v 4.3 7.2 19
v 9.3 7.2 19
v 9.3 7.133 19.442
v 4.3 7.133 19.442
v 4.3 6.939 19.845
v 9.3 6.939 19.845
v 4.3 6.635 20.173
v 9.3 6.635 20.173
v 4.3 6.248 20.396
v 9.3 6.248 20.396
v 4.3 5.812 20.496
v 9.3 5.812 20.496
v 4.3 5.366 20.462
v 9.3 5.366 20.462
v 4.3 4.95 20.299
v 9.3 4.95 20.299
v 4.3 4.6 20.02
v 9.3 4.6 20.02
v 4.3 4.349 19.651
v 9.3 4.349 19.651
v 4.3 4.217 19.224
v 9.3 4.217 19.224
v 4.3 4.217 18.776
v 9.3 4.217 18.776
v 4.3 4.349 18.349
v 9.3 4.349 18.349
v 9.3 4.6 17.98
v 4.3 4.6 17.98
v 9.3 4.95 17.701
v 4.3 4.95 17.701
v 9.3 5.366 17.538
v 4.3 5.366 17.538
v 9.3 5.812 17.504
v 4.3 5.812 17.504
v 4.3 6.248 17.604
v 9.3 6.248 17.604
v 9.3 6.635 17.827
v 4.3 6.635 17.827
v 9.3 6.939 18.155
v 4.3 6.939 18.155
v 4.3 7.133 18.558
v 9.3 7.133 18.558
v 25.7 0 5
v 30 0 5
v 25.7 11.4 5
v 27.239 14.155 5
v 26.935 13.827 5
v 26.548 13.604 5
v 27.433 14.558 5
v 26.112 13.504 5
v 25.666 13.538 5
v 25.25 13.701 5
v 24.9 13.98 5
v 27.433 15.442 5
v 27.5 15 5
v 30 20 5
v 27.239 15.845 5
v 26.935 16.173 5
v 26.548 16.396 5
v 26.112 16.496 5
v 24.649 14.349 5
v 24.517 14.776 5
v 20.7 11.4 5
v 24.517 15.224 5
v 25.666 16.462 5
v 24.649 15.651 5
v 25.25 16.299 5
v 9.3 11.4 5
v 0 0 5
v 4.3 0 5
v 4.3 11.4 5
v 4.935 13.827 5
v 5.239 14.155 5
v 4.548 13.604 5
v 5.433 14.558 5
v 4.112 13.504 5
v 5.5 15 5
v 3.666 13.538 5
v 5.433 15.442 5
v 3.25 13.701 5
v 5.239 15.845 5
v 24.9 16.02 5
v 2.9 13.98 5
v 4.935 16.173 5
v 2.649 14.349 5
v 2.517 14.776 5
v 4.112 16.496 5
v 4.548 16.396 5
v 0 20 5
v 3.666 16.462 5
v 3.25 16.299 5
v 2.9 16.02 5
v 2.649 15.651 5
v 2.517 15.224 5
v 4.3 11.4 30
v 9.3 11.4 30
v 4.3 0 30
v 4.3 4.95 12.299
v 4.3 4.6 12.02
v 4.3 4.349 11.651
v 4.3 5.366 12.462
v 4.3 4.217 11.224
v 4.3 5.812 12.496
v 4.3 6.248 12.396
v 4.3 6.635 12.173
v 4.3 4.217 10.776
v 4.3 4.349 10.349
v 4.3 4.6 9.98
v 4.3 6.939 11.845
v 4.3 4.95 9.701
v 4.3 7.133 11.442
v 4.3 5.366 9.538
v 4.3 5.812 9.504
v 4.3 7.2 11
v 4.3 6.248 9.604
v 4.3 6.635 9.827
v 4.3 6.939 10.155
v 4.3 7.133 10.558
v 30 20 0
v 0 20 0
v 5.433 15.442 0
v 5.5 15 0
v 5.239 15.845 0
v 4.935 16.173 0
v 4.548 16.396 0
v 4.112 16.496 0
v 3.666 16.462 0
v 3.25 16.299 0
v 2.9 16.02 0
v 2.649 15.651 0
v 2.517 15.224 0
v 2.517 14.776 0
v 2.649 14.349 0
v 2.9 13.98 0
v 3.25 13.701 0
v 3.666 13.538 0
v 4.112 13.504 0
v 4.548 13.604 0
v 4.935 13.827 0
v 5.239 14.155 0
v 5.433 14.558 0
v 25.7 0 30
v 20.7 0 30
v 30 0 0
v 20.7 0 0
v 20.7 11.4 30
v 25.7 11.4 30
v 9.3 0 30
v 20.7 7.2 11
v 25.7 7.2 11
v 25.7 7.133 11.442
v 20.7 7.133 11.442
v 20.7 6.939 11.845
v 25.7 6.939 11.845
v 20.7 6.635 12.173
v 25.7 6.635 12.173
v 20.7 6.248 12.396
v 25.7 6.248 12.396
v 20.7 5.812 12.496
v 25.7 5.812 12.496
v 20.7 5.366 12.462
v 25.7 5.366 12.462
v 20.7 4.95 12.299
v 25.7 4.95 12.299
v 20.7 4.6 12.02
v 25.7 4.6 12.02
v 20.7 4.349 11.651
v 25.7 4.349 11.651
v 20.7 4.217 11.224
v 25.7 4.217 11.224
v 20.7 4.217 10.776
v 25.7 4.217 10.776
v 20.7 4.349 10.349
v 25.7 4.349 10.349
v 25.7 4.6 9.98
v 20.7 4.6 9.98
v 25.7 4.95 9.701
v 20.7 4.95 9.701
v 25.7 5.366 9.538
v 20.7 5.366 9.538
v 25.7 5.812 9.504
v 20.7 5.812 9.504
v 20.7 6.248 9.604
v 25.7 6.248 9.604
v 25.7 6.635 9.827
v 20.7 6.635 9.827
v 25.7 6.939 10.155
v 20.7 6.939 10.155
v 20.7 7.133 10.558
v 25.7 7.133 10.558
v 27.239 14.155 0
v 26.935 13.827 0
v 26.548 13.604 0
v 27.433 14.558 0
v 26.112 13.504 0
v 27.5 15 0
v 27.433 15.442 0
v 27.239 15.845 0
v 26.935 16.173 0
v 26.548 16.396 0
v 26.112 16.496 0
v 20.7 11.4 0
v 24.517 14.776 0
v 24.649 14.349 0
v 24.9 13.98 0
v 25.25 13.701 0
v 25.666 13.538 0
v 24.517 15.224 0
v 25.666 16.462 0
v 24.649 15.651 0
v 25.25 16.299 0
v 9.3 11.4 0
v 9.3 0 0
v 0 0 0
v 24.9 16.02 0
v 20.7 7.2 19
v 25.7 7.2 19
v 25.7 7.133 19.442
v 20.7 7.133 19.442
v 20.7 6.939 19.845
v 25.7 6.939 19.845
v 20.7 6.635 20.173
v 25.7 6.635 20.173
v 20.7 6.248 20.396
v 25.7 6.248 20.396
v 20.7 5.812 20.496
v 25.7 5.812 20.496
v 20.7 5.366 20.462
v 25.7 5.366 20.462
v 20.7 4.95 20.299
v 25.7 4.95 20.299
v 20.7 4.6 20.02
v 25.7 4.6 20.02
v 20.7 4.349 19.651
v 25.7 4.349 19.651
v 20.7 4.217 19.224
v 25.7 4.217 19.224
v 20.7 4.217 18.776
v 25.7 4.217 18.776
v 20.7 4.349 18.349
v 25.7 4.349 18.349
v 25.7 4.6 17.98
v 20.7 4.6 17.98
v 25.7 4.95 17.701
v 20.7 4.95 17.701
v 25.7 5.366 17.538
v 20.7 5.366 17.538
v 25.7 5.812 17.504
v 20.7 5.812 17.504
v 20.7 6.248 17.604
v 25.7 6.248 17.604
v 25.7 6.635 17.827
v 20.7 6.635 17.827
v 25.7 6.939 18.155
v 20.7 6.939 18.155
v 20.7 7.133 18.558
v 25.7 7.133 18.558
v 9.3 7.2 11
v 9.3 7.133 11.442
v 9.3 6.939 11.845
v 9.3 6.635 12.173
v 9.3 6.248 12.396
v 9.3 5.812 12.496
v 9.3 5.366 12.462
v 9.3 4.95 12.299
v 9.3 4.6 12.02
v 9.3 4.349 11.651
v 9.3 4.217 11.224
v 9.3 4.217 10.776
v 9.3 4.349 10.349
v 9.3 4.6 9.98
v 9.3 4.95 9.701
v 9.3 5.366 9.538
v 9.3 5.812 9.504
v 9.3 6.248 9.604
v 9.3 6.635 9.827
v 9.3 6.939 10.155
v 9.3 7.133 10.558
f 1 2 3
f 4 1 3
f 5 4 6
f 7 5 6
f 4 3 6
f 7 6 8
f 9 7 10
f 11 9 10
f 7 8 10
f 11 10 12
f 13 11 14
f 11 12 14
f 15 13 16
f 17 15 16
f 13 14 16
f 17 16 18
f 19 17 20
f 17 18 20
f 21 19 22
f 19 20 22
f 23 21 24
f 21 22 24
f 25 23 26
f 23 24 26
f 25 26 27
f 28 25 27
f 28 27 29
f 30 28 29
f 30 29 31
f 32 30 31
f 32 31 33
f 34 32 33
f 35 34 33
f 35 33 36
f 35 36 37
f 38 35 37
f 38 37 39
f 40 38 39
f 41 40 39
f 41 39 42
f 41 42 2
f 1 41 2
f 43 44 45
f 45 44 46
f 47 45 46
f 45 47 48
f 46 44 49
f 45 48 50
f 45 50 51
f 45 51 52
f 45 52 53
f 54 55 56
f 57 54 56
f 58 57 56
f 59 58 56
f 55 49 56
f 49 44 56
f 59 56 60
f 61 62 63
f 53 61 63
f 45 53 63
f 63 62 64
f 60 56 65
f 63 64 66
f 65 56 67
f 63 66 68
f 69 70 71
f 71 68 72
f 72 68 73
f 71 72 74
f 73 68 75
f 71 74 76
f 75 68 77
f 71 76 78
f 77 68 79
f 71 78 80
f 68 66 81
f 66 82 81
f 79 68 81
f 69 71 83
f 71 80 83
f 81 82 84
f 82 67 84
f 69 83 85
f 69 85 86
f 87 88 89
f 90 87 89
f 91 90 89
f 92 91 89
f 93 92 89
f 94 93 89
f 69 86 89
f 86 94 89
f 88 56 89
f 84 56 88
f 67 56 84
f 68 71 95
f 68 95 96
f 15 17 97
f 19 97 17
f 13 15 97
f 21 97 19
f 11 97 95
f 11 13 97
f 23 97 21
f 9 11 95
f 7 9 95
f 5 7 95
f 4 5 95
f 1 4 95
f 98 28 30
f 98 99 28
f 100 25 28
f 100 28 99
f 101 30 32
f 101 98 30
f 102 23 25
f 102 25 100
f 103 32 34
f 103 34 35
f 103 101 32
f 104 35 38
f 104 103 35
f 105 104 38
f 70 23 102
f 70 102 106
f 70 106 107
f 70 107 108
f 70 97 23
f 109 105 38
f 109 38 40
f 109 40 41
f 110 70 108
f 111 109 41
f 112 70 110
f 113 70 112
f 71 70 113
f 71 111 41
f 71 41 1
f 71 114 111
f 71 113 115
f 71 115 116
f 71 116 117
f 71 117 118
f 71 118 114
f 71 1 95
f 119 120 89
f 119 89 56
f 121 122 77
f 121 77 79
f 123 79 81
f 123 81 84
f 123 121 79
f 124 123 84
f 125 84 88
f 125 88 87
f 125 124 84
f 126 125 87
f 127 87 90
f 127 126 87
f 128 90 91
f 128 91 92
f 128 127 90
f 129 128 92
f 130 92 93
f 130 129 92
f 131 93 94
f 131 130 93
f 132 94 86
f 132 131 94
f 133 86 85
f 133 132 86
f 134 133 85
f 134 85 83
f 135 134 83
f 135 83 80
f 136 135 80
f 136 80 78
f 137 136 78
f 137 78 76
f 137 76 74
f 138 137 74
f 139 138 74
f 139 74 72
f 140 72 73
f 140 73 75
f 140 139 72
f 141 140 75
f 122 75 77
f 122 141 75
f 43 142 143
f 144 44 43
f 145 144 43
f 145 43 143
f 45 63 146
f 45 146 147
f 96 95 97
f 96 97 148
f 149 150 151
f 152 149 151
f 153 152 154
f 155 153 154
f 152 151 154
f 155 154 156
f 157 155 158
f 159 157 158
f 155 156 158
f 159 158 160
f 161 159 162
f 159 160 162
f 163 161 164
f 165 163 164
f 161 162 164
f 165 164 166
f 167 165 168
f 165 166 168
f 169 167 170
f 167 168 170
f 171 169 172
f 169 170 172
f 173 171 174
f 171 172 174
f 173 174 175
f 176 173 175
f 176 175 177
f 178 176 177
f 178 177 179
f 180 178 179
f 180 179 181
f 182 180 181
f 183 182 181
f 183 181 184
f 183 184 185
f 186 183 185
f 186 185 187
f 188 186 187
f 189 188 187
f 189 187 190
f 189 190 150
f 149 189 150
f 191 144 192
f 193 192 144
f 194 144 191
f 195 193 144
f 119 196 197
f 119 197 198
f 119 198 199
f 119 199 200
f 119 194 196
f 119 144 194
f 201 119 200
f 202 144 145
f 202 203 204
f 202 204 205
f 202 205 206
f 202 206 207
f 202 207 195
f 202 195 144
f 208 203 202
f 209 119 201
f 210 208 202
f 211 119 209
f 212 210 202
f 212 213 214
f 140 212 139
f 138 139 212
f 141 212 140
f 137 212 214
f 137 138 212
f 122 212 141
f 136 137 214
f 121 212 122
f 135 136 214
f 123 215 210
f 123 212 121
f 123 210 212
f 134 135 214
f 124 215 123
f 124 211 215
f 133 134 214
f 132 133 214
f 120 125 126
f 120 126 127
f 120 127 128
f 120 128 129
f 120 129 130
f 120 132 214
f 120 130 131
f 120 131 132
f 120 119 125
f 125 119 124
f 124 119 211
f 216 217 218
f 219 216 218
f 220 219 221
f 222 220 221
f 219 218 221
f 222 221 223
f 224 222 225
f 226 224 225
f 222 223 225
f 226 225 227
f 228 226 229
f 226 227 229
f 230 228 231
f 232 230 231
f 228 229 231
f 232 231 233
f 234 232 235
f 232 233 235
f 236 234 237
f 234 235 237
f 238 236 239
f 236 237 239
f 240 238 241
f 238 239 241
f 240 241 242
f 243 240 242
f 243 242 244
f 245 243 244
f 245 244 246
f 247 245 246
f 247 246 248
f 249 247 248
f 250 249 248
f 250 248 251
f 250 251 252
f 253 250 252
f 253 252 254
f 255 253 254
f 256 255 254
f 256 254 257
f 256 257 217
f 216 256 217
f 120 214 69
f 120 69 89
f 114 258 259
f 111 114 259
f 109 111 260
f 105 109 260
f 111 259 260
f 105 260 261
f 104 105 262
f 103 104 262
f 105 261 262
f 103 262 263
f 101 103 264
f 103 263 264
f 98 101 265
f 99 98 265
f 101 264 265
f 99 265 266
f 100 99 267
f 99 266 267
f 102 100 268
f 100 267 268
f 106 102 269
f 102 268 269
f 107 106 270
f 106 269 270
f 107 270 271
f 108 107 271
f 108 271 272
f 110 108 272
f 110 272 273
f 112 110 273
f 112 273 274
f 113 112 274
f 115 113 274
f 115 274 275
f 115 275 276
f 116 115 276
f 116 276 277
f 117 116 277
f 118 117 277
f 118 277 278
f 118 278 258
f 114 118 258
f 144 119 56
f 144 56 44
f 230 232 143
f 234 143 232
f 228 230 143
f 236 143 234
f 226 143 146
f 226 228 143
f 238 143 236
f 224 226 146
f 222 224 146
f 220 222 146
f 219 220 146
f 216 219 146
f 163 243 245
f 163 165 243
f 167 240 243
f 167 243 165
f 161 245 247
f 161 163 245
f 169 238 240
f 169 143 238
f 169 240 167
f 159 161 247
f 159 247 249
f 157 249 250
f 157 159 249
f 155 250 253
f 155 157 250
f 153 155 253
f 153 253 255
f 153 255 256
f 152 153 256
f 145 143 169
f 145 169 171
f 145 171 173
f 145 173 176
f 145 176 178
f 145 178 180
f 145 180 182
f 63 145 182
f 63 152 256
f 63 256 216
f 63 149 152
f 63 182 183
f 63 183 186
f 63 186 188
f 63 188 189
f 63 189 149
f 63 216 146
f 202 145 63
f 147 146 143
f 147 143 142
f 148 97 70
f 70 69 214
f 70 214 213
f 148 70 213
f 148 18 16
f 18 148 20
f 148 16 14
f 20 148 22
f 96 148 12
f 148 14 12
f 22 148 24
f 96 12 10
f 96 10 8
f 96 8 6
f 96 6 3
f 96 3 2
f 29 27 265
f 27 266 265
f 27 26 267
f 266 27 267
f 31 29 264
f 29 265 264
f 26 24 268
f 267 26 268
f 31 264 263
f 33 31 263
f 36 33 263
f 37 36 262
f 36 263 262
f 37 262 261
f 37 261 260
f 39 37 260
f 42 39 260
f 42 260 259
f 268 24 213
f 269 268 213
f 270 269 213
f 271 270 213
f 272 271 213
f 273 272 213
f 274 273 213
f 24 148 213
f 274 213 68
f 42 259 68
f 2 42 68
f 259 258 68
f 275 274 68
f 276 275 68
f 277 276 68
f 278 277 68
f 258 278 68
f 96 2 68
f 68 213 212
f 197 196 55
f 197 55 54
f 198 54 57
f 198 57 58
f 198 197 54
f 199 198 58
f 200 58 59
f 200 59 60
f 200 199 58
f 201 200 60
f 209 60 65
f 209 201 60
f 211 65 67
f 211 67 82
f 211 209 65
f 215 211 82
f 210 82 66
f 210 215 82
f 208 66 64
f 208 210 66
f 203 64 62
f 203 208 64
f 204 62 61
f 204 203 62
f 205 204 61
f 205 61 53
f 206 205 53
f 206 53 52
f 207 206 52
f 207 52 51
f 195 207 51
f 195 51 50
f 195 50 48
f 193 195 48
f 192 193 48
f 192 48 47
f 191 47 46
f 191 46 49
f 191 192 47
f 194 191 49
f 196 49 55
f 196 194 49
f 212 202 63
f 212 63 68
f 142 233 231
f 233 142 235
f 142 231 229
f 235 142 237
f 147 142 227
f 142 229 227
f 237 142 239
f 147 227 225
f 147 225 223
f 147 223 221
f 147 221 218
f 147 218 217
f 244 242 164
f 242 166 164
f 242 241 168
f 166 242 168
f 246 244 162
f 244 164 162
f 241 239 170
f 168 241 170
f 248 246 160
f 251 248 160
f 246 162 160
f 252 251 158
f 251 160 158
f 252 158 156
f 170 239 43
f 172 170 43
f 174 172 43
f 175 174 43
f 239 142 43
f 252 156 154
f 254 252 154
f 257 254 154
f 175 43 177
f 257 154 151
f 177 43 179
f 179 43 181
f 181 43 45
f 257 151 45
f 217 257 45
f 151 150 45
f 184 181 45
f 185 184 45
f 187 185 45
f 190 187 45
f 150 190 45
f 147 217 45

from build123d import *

# Parameters (mm, degrees)
SKETCH_R     = 1.5
PAD_DEPTH    = 5
SKETCH001_W  = 5
SKETCH001_H  = 11.4
PAD001_DEPTH = 25
SKETCH002_R  = 1.5
POCKET_DEPTH = 25.701


with BuildPart() as part:
    # Sketch → Pad (new body)
    with BuildSketch(Plane.XY):
        Polygon((0, 0), (0, 20), (30, 20), (30, 0), (20.7, 0), (20.7, 11.4), (9.3, 11.4), (9.3, 0), align=None)
        with Locations((4, 15)):
            Circle(SKETCH_R, mode=Mode.SUBTRACT)
        with Locations((26, 15)):
            Circle(SKETCH_R, mode=Mode.SUBTRACT)
    extrude(amount=PAD_DEPTH)

    # Sketch001 → Pad001 (new body)
    with BuildSketch(Plane.XY.offset(5)):
        with Locations((6.8, 5.7)):
            Rectangle(SKETCH001_W, SKETCH001_H)
        with Locations((23.2, 5.7)):
            Rectangle(SKETCH001_W, SKETCH001_H)
    extrude(amount=PAD001_DEPTH)

    # Sketch002 → Pocket (cut, through all)
    with BuildSketch(Plane.YZ.offset(25.7)):
        with Locations((5.7, 19)):
            Circle(SKETCH002_R)
        with Locations((5.7, 11)):
            Circle(SKETCH002_R)
    extrude(amount=-POCKET_DEPTH, mode=Mode.SUBTRACT)


solid = part.part
